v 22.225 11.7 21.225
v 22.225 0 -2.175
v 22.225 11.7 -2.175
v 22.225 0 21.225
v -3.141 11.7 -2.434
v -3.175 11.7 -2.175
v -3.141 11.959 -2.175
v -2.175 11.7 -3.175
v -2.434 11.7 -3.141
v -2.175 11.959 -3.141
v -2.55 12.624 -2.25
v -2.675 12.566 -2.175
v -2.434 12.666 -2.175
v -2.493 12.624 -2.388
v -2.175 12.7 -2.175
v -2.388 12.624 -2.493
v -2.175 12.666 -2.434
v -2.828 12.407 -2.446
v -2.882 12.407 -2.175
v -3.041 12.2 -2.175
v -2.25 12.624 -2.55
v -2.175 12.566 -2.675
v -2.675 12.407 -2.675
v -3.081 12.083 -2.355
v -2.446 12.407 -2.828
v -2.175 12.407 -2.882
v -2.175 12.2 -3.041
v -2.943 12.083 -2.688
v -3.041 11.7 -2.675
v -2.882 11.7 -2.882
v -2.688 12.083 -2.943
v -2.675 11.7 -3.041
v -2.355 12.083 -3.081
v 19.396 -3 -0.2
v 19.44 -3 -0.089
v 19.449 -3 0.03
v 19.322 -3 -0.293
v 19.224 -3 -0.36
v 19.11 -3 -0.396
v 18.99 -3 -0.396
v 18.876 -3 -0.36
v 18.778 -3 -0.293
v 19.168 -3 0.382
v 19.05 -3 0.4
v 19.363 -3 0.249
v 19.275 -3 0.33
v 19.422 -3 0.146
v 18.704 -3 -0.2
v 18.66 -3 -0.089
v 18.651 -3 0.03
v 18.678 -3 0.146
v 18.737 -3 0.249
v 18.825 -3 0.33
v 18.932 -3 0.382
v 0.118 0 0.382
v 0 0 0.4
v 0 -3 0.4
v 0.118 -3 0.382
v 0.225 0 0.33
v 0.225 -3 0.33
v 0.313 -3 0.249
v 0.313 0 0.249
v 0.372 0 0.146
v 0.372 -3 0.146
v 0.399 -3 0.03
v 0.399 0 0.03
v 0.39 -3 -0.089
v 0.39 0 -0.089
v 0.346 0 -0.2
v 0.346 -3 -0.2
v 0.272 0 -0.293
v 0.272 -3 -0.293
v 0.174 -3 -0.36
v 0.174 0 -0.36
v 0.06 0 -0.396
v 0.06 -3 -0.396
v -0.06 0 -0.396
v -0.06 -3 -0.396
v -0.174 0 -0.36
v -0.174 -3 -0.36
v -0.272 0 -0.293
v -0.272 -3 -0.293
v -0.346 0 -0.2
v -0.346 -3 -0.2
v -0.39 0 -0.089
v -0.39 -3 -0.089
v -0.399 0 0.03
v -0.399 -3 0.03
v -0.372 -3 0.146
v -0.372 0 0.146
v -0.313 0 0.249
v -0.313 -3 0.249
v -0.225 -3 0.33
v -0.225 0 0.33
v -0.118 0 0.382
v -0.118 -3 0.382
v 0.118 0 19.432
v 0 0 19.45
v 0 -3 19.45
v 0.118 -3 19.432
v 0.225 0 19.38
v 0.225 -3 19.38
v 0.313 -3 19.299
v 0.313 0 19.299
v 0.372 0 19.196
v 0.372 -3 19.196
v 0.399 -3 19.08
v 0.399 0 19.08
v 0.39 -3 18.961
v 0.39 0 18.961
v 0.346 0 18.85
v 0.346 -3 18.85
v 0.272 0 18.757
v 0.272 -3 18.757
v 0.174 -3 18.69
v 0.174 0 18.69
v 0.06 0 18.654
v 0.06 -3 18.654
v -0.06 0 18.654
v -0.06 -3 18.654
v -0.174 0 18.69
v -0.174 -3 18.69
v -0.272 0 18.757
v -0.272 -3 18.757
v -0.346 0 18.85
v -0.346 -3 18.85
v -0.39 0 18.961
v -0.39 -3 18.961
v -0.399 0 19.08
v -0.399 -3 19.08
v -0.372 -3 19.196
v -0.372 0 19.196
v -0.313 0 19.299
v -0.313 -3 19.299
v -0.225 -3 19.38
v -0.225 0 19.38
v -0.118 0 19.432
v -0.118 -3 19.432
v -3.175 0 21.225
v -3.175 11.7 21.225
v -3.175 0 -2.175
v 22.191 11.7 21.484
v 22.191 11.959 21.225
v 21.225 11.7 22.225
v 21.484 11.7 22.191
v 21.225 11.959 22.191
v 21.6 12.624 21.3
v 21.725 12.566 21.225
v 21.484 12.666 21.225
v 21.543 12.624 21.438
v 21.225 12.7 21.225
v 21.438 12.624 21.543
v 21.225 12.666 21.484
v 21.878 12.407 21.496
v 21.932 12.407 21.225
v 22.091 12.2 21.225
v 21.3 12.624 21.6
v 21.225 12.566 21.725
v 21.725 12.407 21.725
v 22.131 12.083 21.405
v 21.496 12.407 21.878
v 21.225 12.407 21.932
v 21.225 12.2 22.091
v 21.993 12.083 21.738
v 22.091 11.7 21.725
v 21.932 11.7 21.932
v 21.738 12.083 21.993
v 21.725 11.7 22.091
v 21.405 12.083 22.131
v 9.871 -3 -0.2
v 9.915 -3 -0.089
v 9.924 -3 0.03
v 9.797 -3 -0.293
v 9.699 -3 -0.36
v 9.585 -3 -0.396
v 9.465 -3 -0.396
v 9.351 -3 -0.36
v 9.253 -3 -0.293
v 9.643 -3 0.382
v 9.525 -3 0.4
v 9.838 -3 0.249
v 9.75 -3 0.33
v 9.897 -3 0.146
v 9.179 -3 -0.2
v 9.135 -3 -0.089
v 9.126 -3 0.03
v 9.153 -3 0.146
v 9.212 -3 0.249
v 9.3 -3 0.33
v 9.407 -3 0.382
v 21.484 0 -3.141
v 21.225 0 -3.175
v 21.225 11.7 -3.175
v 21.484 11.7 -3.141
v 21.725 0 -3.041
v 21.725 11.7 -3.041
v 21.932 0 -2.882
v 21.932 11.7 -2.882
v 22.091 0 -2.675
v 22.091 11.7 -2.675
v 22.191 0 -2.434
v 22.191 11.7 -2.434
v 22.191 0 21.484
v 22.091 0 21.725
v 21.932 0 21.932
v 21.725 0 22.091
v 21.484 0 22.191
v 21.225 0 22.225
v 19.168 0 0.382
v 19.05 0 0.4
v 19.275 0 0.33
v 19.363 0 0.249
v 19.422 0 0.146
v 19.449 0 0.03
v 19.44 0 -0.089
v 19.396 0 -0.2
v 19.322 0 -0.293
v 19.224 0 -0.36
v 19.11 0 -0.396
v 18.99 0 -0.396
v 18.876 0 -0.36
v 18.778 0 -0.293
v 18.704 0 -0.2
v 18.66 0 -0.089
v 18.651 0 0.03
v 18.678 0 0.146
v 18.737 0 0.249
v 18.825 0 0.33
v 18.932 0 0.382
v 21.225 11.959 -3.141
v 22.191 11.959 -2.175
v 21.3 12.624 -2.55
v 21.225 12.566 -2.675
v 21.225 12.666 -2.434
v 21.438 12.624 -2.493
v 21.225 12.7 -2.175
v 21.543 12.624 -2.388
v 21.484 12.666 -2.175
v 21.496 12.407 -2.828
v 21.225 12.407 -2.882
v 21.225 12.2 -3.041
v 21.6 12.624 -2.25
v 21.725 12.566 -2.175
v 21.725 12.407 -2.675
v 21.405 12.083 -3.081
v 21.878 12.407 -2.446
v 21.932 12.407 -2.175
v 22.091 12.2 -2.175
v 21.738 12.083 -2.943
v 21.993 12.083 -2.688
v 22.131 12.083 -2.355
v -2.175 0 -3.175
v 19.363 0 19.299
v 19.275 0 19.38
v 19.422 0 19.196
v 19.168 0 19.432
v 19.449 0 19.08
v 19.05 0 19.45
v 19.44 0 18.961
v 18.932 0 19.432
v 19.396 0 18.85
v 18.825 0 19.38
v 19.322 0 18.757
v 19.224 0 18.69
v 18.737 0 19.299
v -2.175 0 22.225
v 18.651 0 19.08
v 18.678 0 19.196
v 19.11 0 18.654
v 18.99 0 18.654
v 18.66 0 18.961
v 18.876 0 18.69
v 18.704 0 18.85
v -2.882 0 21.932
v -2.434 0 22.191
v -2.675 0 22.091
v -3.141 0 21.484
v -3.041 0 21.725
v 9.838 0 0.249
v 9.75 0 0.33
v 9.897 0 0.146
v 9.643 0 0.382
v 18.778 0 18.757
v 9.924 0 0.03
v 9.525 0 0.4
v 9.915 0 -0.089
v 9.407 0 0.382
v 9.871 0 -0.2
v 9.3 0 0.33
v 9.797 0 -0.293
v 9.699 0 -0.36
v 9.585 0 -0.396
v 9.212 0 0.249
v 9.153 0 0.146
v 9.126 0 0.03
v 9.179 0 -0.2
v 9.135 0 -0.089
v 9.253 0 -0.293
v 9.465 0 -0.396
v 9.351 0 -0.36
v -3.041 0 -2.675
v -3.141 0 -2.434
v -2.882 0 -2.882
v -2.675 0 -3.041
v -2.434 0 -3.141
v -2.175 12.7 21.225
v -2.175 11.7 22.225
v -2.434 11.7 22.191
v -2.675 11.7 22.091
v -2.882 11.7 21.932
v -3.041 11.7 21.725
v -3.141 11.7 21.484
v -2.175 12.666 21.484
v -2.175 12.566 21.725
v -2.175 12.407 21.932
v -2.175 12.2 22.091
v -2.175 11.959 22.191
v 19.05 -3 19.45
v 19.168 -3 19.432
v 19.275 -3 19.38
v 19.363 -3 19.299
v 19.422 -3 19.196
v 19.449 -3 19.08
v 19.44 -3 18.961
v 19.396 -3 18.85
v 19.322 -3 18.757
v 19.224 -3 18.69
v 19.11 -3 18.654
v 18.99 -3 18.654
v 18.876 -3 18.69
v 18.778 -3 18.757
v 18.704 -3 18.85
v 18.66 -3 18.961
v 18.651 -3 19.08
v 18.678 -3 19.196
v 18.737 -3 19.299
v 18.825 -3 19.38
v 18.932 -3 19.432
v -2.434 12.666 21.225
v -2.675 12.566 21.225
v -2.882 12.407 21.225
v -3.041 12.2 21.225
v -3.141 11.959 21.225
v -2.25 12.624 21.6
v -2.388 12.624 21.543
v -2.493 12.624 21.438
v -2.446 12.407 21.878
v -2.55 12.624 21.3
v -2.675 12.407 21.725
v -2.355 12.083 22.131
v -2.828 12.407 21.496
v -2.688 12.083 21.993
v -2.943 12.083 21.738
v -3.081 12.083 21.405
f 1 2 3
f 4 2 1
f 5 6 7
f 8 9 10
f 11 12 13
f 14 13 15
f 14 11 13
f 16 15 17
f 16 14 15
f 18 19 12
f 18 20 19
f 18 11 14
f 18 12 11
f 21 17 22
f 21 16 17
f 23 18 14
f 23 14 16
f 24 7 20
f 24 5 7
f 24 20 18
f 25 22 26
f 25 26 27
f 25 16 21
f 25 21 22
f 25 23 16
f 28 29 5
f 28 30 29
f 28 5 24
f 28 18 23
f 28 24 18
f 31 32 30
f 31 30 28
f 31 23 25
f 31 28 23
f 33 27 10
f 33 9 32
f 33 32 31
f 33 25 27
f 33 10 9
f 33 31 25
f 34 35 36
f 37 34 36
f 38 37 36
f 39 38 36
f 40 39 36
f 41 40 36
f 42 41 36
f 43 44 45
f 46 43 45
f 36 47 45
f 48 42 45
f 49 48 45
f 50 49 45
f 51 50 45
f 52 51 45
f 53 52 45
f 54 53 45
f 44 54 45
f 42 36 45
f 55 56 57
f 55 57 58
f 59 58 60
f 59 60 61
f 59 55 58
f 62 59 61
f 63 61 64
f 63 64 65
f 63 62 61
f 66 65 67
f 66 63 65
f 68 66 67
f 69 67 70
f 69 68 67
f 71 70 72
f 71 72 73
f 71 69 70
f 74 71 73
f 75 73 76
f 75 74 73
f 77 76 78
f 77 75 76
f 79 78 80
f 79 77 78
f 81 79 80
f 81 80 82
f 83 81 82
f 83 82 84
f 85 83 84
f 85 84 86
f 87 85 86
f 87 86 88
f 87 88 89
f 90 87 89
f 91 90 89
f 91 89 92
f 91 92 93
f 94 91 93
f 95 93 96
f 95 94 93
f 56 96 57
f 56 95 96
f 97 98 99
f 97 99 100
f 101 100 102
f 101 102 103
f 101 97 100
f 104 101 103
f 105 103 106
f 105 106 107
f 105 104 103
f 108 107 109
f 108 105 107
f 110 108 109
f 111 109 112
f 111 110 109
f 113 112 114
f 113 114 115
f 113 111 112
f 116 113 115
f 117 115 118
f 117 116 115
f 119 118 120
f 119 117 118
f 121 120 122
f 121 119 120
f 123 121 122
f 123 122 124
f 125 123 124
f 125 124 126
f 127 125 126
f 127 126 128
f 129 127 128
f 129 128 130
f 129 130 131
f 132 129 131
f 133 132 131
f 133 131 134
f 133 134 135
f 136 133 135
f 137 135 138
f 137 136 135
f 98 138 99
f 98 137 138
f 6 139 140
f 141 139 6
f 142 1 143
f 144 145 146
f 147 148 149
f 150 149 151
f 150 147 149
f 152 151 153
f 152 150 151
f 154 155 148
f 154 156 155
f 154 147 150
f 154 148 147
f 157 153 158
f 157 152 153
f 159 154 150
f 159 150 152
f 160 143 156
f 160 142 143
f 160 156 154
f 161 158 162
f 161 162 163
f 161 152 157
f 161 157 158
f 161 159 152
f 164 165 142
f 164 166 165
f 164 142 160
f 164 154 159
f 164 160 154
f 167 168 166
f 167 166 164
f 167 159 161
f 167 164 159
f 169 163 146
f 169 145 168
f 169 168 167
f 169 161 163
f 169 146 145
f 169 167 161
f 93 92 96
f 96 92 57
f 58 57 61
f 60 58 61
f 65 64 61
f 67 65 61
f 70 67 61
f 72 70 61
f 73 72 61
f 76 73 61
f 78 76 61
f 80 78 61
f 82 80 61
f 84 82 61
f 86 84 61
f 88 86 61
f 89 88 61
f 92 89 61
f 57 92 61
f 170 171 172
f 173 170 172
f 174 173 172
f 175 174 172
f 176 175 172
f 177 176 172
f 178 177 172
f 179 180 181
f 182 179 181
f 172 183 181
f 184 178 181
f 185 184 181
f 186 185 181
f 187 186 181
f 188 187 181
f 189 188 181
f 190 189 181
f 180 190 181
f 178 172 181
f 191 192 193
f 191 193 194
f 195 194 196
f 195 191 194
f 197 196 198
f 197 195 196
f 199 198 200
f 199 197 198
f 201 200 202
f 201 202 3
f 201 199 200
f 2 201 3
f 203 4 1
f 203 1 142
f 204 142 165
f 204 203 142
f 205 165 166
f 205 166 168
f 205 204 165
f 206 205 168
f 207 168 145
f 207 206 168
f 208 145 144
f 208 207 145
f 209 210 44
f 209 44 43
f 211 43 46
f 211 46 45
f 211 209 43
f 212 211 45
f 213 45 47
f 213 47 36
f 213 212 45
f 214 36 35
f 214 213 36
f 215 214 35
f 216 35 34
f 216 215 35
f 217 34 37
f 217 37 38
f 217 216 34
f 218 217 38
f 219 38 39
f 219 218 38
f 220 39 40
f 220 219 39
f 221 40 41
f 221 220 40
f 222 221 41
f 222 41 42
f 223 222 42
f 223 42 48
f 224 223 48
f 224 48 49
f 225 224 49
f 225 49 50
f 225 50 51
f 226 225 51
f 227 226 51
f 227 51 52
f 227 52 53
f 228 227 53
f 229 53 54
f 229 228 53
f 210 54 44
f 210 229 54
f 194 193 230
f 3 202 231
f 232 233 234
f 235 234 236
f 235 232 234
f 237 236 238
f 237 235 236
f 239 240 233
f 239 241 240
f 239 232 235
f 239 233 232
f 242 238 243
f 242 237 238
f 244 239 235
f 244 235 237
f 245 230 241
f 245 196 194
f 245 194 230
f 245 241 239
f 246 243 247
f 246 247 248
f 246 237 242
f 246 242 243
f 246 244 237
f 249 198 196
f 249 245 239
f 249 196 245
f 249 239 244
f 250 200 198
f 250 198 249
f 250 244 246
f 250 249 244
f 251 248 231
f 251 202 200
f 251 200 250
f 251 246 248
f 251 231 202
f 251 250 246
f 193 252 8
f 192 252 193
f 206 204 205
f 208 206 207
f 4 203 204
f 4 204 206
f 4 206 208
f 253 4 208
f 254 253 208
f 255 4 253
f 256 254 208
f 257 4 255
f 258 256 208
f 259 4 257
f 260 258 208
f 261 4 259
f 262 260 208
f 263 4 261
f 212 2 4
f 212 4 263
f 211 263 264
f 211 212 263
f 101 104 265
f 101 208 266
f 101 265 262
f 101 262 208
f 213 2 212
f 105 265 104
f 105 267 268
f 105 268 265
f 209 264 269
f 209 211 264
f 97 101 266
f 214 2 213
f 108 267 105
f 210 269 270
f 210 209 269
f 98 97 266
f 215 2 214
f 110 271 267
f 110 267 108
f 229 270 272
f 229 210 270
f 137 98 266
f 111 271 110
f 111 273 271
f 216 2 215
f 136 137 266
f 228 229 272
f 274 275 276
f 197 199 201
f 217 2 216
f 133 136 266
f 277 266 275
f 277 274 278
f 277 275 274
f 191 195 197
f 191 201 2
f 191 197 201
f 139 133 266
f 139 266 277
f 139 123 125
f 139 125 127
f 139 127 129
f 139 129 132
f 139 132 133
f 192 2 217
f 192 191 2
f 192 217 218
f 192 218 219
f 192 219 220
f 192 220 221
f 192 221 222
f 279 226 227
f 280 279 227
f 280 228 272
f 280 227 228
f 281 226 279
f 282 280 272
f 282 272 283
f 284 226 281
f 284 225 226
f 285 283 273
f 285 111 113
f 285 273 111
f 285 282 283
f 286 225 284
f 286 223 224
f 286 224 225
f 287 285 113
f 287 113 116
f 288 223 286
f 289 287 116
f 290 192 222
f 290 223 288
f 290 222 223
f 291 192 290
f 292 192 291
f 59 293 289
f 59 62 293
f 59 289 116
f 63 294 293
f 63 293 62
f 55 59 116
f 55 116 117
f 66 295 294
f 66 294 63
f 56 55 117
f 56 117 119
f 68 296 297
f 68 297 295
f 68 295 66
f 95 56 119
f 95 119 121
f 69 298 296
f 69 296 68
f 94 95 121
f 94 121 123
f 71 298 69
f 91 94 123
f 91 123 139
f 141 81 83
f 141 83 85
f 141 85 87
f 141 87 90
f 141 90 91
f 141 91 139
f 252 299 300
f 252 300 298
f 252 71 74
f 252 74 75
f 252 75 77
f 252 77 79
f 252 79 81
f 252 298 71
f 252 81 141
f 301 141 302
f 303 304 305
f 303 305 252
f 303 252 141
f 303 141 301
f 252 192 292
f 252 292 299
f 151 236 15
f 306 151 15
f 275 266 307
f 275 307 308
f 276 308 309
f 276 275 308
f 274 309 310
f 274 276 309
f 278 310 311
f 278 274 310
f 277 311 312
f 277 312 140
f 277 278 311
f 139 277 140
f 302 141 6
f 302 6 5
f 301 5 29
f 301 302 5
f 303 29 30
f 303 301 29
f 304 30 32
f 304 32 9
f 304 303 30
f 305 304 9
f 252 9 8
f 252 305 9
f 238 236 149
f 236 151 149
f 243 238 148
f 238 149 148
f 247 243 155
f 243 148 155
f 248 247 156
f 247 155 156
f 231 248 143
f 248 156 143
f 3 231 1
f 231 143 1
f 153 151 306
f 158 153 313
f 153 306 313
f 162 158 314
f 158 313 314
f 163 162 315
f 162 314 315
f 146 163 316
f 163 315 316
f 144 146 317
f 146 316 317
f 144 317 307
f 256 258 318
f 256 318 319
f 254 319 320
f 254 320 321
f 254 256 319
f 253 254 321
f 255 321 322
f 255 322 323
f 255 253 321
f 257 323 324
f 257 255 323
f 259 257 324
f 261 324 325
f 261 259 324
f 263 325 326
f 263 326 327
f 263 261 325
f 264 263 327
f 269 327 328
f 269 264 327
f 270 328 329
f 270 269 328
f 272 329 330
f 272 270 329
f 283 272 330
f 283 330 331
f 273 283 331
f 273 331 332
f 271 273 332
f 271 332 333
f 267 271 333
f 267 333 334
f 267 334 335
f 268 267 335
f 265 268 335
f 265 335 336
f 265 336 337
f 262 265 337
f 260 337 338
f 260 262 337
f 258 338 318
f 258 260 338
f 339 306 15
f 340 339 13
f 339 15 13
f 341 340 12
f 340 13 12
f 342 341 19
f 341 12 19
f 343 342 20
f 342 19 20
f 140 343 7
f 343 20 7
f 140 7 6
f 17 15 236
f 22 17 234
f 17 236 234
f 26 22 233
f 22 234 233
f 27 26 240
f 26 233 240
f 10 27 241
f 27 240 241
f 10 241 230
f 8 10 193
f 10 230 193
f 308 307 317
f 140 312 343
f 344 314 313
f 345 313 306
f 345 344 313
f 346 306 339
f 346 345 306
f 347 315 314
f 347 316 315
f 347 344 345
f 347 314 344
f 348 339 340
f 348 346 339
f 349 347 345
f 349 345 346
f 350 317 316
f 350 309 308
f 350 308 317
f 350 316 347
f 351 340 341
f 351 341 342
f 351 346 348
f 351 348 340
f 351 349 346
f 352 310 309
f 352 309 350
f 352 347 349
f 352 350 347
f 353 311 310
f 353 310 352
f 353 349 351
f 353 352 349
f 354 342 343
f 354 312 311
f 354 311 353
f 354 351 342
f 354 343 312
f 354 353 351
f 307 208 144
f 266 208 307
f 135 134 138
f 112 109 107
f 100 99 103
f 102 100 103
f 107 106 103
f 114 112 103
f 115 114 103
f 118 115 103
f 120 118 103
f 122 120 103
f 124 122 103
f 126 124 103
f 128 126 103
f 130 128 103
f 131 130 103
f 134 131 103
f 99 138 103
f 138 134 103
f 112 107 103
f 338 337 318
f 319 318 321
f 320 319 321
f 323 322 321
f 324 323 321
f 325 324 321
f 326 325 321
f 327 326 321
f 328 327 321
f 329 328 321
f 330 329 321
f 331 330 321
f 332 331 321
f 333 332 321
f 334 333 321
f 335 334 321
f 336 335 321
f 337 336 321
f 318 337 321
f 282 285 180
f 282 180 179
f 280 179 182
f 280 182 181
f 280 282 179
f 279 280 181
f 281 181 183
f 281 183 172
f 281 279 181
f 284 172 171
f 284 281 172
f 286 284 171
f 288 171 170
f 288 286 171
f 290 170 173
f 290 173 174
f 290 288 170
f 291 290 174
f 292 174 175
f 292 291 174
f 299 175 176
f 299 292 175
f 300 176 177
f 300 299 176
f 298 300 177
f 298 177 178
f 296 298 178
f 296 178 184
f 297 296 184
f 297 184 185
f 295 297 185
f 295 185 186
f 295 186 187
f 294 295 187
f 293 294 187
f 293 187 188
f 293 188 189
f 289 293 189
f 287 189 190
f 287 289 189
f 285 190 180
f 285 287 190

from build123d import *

# Parameters (mm, degrees)
SKETCH_2_R        = 0.4
EXTRUDE_1_DEPTH   = 3
EXTRUDE_1_2_DEPTH = 3
EXTRUDE_1_3_DEPTH = 3
EXTRUDE_1_4_DEPTH = 3
EXTRUDE_1_5_DEPTH = 3
EXTRUDE_2_DEPTH   = 12.7
FILLET_1_R        = 1


with BuildPart() as part:
    # Эскиз2 → Бобышка-Вытянуть1 (new body)
    with BuildSketch(Plane(origin=(0, 0, 0), x_dir=(1, 0, 0), z_dir=(0, 1, 0))):
        with Locations(Location((0, 0, 0), (0, 0, 270))):
            Circle(SKETCH_2_R)
    extrude(amount=-EXTRUDE_1_DEPTH)



with BuildPart() as body_2:
    # Эскиз2 → Extrude 1 2 (new body)
    with BuildSketch(Plane(origin=(0, 0, 0), x_dir=(1, 0, 0), z_dir=(0, 1, 0))):
        with Locations(Location((9.525, 0, 0), (0, 0, 270))):
            Circle(SKETCH_2_R)
    extrude(amount=-EXTRUDE_1_2_DEPTH)


with BuildPart() as body_3:
    # Эскиз2 → Extrude 1 3 (new body)
    with BuildSketch(Plane(origin=(0, 0, 0), x_dir=(1, 0, 0), z_dir=(0, 1, 0))):
        with Locations(Location((0, -19.05, 0), (0, 0, 270))):
            Circle(SKETCH_2_R)
    extrude(amount=-EXTRUDE_1_3_DEPTH)


with BuildPart() as body_4:
    # Эскиз2 → Extrude 1 4 (new body)
    with BuildSketch(Plane(origin=(0, 0, 0), x_dir=(1, 0, 0), z_dir=(0, 1, 0))):
        with Locations(Location((19.05, -19.05, 0), (0, 0, 270))):
            Circle(SKETCH_2_R)
    extrude(amount=-EXTRUDE_1_4_DEPTH)


with BuildPart() as body_5:
    # Эскиз2 → Extrude 1 5 (new body)
    with BuildSketch(Plane(origin=(0, 0, 0), x_dir=(1, 0, 0), z_dir=(0, 1, 0))):
        with Locations(Location((19.05, 0, 0), (0, 0, 270))):
            Circle(SKETCH_2_R)
    extrude(amount=-EXTRUDE_1_5_DEPTH)


with BuildPart() as part_1:
    add(part.part)

    add(body_2.part)  # Бобышка-Вытянуть2 merges body 2

    add(body_3.part)  # Бобышка-Вытянуть2 merges body 3

    add(body_4.part)  # Бобышка-Вытянуть2 merges body 4

    add(body_5.part)  # Бобышка-Вытянуть2 merges body 5
    # Эскиз3 → Бобышка-Вытянуть2 (add)
    with BuildSketch(Plane(origin=(0, 0, 0), x_dir=(1, 0, 0), z_dir=(0, 1, 0))):
        with BuildLine():
            Line((-2.175, 3.175), (21.225, 3.175))
            ThreePointArc((21.225, 3.175), (21.932106781, 2.882106781), (22.225, 2.175))
            Line((22.225, 2.175), (22.225, -21.225))
            ThreePointArc((22.225, -21.225), (21.932106781, -21.932106781), (21.225, -22.225))
            Line((21.225, -22.225), (-2.175, -22.225))
            ThreePointArc((-2.175, -22.225), (-2.882106781, -21.932106781), (-3.175, -21.225))
            Line((-3.175, -21.225), (-3.175, 2.175))
            ThreePointArc((-3.175, 2.175), (-2.882106781, 2.882106781), (-2.175, 3.175))
        make_face()
    extrude(amount=EXTRUDE_2_DEPTH)

    # Скругление1
    fillet_1_edges = [part_1.edges().sort_by_distance(p)[0] for p in [
        (22.225, 12.7, 9.525),
        (21.932106781, 12.7, -2.882106781),
        (9.525, 12.7, -3.175),
        (-2.882106781, 12.7, -2.882106781),
        (-3.175, 12.7, 9.525),
        (-2.882106781, 12.7, 21.932106781),
        (9.525, 12.7, 22.225),
        (21.932106781, 12.7, 21.932106781),
    ]]
    fillet(fillet_1_edges, radius=FILLET_1_R)


solid = part_1.part
